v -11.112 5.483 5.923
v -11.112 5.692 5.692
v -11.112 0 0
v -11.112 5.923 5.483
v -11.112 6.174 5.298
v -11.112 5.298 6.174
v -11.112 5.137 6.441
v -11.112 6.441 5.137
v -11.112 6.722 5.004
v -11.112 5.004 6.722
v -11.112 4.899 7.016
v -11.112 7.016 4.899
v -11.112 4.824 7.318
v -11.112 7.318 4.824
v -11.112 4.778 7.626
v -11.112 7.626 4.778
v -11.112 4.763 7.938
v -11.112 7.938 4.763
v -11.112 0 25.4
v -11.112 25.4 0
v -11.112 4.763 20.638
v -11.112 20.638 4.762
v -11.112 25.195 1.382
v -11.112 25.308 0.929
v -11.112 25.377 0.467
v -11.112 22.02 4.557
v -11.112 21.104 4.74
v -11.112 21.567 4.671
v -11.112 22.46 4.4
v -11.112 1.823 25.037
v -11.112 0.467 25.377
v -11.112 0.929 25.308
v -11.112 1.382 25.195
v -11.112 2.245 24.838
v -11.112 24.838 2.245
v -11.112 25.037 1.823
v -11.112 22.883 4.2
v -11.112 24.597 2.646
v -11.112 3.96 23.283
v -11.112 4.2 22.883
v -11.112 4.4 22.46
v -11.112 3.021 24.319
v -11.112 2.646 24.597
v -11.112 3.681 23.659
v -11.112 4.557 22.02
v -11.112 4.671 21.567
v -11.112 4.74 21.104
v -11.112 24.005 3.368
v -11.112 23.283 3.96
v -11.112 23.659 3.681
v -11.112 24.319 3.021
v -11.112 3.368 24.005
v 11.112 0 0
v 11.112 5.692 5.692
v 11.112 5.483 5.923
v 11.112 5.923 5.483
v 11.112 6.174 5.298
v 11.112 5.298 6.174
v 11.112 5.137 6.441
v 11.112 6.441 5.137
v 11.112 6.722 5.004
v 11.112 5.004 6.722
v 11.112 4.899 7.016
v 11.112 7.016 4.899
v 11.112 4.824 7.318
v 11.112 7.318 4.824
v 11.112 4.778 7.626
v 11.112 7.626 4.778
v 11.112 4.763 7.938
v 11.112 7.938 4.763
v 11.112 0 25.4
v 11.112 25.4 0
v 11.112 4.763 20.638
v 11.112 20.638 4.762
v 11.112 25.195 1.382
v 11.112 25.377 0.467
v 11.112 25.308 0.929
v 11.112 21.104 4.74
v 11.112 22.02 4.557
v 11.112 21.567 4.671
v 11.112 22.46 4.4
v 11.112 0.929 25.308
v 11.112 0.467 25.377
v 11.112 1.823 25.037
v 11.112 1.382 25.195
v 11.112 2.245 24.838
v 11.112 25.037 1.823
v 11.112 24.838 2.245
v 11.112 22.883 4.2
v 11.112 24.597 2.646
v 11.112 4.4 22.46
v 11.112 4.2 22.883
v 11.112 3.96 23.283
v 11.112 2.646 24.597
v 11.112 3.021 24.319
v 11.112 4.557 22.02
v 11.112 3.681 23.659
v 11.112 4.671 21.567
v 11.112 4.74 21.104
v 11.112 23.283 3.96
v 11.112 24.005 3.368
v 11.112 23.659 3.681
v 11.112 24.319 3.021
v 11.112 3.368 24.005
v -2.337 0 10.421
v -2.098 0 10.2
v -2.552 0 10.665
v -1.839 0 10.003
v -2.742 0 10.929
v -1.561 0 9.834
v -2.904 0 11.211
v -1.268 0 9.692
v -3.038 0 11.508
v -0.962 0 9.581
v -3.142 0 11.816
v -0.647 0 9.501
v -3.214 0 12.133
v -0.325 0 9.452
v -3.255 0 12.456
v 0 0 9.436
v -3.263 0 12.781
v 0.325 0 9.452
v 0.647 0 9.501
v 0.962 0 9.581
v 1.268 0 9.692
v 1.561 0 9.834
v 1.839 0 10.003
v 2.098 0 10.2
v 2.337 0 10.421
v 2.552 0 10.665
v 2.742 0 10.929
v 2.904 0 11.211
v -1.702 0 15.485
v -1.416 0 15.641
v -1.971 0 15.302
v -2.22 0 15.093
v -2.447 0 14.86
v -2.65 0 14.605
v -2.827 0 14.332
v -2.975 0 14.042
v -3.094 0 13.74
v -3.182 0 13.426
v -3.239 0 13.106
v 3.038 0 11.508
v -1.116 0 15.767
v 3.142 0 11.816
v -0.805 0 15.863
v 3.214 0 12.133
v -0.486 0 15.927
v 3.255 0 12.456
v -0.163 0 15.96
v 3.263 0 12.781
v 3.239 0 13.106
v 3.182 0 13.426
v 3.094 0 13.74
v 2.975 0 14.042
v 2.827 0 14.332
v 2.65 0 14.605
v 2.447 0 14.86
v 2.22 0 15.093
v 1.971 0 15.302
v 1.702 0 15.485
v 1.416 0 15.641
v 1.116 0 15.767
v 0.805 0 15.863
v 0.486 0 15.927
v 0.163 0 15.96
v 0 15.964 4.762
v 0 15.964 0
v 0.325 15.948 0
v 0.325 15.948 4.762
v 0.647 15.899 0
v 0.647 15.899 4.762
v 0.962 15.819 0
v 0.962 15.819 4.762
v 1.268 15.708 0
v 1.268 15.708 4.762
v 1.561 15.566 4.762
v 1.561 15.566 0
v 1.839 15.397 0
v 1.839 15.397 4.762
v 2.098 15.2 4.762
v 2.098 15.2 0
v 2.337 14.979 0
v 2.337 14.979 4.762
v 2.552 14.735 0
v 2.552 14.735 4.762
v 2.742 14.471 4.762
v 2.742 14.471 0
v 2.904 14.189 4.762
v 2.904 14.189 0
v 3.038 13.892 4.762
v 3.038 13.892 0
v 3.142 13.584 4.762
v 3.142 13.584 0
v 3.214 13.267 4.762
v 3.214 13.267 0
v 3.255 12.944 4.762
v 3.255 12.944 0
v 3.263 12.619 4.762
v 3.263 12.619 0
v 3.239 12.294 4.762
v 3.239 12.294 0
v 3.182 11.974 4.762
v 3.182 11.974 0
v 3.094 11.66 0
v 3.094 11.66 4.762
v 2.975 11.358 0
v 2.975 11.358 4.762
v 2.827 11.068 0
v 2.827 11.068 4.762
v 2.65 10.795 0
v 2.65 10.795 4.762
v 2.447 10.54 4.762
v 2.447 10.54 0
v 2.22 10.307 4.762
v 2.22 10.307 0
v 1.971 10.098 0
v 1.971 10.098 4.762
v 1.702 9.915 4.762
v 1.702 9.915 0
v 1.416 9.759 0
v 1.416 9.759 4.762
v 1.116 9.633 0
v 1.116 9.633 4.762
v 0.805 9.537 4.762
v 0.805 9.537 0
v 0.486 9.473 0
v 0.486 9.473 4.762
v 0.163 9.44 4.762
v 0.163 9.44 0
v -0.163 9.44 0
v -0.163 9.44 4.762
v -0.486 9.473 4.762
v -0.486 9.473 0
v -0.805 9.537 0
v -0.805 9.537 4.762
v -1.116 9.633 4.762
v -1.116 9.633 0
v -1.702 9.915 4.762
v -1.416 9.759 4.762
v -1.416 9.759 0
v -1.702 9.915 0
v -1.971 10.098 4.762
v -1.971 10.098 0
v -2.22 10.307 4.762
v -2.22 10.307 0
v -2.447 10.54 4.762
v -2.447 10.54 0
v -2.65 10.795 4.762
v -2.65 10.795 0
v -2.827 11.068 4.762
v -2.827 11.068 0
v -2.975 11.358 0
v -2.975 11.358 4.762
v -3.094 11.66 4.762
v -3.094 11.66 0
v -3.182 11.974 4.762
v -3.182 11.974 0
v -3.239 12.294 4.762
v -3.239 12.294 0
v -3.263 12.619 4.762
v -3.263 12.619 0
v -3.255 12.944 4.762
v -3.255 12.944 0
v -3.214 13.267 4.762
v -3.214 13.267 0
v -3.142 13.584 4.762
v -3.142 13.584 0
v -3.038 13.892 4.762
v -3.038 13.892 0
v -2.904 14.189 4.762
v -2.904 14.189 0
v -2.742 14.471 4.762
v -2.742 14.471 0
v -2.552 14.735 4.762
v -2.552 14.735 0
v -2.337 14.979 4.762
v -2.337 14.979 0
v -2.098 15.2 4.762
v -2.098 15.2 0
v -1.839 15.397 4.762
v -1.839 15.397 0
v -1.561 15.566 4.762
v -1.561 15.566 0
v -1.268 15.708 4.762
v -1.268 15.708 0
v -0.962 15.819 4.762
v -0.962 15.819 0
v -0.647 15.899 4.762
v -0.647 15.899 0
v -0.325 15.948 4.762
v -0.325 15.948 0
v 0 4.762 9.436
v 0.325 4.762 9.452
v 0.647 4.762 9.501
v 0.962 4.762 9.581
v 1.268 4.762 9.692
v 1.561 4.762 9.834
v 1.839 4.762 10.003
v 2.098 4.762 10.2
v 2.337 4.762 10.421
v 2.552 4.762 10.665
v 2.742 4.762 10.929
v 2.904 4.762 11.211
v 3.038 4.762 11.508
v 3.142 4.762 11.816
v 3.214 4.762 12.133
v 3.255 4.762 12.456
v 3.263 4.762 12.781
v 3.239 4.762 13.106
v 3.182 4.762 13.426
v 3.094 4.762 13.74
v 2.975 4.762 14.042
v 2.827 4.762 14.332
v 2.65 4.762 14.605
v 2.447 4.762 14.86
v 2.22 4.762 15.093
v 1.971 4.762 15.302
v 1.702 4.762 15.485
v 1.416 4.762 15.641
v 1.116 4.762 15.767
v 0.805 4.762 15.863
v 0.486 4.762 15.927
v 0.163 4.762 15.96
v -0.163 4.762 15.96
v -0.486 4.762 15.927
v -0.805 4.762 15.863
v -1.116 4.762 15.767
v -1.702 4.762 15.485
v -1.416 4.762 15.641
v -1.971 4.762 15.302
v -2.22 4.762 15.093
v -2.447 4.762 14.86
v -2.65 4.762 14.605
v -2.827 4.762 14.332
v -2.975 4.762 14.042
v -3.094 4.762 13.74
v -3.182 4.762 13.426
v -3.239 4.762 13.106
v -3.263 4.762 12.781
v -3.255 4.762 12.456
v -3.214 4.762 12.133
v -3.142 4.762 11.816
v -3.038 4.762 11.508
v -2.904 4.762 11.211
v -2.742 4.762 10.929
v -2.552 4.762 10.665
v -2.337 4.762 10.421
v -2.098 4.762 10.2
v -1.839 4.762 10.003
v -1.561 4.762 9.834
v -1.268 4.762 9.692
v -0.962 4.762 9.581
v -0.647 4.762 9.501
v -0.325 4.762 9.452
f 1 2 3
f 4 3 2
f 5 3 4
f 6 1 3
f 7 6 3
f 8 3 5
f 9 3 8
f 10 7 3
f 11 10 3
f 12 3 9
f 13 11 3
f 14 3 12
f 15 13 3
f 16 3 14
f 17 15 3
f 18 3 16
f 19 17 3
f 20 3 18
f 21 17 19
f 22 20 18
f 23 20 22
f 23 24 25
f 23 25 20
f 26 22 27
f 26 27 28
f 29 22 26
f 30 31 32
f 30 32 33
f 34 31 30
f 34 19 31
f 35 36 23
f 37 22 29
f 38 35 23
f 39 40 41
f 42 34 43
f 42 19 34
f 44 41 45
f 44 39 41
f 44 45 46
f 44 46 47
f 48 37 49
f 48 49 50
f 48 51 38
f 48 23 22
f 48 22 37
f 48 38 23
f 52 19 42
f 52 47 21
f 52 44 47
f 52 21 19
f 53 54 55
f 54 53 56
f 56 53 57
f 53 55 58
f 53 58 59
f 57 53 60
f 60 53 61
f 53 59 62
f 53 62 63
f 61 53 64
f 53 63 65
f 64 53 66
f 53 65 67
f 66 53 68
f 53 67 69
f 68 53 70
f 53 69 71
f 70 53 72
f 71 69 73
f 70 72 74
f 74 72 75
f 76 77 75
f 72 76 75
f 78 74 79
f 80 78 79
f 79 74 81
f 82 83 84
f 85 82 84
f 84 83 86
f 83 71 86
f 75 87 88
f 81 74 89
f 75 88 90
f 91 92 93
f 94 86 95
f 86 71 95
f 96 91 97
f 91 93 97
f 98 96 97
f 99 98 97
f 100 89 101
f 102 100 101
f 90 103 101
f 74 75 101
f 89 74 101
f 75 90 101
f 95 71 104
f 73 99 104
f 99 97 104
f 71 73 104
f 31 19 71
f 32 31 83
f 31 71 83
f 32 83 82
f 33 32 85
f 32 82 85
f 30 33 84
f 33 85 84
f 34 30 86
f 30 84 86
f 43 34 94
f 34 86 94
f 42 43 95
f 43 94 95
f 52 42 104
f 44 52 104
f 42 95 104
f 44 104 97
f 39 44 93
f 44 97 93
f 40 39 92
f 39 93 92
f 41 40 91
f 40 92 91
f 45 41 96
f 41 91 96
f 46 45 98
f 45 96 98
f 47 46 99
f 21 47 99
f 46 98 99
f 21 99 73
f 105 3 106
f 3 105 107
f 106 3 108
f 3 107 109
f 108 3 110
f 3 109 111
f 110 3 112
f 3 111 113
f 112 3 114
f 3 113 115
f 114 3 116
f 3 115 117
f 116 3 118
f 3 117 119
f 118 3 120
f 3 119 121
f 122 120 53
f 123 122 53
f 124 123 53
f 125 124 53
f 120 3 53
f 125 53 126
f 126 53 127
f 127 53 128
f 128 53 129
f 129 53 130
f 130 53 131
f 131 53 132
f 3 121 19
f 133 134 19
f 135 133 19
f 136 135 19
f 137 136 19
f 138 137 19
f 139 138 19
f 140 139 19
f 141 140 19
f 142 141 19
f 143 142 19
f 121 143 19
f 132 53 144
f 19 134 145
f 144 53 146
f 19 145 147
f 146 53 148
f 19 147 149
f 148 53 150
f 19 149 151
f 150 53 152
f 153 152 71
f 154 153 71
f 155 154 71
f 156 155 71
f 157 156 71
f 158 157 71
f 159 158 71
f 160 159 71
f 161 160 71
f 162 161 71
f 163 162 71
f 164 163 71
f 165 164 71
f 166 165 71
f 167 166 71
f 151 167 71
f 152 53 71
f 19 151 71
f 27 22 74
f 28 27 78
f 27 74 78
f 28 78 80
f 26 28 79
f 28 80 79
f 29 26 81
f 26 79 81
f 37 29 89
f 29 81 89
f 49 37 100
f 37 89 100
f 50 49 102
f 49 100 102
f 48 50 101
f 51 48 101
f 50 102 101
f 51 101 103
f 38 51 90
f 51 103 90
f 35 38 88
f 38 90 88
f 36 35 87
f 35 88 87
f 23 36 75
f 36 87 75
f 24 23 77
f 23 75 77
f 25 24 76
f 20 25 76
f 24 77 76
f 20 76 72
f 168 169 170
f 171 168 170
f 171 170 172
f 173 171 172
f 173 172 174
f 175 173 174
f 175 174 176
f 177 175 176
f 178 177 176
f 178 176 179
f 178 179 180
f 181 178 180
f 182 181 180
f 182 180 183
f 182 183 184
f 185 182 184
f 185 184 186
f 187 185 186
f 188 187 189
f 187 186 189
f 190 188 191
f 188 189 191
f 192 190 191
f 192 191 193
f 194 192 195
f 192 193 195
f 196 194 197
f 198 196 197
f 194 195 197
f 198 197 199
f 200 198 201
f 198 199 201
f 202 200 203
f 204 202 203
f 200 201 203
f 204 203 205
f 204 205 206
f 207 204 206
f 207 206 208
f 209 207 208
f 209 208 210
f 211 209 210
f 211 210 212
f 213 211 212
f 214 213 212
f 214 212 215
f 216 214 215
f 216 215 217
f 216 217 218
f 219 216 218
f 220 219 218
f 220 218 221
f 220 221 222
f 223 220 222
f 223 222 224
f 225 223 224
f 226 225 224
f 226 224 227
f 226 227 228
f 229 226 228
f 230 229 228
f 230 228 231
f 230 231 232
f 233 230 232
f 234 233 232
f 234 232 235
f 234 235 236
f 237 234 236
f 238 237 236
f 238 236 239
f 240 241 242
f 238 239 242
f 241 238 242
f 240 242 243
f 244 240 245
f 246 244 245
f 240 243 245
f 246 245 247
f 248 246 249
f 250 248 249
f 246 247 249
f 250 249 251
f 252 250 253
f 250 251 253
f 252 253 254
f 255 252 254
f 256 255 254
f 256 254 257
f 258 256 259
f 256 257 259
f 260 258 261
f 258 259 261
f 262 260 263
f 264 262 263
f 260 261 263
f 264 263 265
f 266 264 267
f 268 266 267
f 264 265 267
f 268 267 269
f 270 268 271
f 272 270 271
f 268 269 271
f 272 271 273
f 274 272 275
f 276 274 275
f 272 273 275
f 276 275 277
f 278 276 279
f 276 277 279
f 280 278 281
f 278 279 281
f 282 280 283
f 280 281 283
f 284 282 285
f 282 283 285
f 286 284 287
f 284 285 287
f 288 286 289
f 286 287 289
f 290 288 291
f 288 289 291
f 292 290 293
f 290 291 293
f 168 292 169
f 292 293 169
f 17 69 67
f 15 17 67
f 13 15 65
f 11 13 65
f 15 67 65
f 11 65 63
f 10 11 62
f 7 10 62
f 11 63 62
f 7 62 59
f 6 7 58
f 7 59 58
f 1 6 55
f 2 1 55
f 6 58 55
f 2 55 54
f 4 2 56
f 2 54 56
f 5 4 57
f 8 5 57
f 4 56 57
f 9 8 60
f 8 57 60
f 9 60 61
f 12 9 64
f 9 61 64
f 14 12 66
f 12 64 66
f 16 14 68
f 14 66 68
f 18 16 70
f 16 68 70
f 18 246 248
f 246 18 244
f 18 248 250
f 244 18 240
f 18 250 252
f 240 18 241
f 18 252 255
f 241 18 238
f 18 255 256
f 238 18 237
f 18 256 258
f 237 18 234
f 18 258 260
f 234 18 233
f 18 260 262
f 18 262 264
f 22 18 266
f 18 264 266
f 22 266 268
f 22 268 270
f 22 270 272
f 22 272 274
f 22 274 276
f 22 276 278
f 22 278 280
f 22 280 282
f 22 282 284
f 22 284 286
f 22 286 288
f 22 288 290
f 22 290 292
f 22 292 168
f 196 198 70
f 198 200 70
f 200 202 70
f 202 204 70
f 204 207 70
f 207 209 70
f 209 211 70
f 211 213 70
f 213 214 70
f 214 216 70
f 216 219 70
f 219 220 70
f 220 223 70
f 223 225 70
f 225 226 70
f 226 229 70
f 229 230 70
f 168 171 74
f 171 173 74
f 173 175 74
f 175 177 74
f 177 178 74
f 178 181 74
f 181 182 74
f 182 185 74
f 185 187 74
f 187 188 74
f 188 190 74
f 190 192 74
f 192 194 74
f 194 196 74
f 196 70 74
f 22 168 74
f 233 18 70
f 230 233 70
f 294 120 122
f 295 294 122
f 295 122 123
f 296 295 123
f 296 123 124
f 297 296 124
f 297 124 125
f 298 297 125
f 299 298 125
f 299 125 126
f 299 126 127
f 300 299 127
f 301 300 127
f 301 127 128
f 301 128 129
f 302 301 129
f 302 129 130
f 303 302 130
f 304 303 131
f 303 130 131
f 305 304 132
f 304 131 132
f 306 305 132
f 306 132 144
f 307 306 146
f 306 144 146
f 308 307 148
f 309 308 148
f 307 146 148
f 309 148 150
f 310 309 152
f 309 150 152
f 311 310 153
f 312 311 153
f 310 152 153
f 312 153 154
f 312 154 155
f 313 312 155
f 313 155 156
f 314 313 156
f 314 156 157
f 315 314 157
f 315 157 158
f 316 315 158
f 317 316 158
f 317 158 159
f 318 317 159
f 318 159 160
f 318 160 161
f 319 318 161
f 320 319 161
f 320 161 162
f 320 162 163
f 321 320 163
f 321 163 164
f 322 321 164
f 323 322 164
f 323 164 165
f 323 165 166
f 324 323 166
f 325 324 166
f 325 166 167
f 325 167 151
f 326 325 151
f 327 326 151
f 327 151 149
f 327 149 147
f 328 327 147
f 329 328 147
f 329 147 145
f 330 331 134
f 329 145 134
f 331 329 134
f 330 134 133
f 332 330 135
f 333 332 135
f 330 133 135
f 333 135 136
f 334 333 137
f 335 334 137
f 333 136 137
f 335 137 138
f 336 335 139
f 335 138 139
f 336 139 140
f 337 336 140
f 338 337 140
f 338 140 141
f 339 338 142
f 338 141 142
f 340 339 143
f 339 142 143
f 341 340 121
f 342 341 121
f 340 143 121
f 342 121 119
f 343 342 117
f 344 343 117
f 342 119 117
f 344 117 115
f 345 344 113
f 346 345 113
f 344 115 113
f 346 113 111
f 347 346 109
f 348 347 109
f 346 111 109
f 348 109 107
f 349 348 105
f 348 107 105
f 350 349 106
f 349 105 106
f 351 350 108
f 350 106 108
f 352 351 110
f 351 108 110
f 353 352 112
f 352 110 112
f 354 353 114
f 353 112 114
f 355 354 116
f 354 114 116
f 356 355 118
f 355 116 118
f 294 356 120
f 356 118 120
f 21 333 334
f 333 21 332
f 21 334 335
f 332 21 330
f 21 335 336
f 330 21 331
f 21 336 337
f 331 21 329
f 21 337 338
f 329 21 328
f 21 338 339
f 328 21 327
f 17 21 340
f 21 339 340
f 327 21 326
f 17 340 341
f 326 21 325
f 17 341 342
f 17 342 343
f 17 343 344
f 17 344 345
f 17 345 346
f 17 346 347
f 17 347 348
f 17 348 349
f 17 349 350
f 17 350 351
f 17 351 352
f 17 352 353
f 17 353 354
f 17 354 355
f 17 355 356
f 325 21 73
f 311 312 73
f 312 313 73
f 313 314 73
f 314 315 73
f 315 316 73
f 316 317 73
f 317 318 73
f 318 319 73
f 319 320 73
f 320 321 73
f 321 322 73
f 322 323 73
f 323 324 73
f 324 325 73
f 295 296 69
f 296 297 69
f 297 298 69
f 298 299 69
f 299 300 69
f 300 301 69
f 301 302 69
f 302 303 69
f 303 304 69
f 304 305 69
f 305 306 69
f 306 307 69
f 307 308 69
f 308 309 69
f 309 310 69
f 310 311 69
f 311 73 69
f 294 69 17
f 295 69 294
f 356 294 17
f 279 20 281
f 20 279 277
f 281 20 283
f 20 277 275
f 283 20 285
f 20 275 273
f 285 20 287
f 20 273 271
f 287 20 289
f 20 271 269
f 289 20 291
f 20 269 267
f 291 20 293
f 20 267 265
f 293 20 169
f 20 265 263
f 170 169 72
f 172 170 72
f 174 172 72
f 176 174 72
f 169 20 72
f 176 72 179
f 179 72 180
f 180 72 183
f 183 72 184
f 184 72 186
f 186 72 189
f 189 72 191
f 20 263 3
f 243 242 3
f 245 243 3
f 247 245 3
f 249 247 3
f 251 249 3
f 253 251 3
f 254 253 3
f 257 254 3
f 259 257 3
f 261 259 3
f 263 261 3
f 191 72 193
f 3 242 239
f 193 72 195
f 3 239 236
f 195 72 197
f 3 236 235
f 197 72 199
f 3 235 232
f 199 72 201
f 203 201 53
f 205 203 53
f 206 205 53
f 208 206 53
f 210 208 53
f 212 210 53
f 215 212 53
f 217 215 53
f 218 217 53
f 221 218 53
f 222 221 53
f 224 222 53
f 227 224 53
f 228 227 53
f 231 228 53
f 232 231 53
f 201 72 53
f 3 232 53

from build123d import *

# Parameters (mm, degrees)
BASE_EXTRUDE_DEPTH = 11.1125
SKETCH2_R          = 3.2639
HOLE1_DEPTH        = 38.600633721
SKETCH3_R          = 3.2639
HOLE2_DEPTH        = 38.600633721


with BuildPart() as part:
    # Sketch1 → Base Extrude (new, symmetric)
    with BuildSketch(Plane(origin=(0, 0, 0), x_dir=(0, 0, -1), z_dir=(1, 0, 0))):
        with BuildLine():
            Line((-4.7625, 7.9375), (-4.7625, 20.6375))
            ThreePointArc((-4.7625, 20.6375), (-3.367596045, 24.005096045), (0, 25.4))
            Line((0, 25.4), (0, 0))
            Line((0, 0), (-25.4, 0))
            ThreePointArc((-25.4, 0), (-24.005096045, 3.367596045), (-20.6375, 4.7625))
            Line((-20.6375, 4.7625), (-7.9375, 4.7625))
            ThreePointArc((-7.9375, 4.7625), (-5.69243597, 5.69243597), (-4.7625, 7.9375))
        make_face()
    extrude(amount=BASE_EXTRUDE_DEPTH, both=True)

    # Sketch2 → Hole1 (cut, through all)
    with BuildSketch(Plane.XZ):
        with Locations(Location((0, 12.7, 0), (0, 0, 270))):
            Circle(SKETCH2_R)
    extrude(amount=-HOLE1_DEPTH, mode=Mode.SUBTRACT)

    # Sketch3 → Hole2 (cut, through all)
    with BuildSketch(Plane(origin=(0, 0, 0), x_dir=(-1, 0, 0), z_dir=(0, 0, -1))):
        with Locations(Location((0, 12.7, 0), (0, 0, 90))):
            Circle(SKETCH3_R)
    extrude(amount=-HOLE2_DEPTH, mode=Mode.SUBTRACT)


solid = part.part
